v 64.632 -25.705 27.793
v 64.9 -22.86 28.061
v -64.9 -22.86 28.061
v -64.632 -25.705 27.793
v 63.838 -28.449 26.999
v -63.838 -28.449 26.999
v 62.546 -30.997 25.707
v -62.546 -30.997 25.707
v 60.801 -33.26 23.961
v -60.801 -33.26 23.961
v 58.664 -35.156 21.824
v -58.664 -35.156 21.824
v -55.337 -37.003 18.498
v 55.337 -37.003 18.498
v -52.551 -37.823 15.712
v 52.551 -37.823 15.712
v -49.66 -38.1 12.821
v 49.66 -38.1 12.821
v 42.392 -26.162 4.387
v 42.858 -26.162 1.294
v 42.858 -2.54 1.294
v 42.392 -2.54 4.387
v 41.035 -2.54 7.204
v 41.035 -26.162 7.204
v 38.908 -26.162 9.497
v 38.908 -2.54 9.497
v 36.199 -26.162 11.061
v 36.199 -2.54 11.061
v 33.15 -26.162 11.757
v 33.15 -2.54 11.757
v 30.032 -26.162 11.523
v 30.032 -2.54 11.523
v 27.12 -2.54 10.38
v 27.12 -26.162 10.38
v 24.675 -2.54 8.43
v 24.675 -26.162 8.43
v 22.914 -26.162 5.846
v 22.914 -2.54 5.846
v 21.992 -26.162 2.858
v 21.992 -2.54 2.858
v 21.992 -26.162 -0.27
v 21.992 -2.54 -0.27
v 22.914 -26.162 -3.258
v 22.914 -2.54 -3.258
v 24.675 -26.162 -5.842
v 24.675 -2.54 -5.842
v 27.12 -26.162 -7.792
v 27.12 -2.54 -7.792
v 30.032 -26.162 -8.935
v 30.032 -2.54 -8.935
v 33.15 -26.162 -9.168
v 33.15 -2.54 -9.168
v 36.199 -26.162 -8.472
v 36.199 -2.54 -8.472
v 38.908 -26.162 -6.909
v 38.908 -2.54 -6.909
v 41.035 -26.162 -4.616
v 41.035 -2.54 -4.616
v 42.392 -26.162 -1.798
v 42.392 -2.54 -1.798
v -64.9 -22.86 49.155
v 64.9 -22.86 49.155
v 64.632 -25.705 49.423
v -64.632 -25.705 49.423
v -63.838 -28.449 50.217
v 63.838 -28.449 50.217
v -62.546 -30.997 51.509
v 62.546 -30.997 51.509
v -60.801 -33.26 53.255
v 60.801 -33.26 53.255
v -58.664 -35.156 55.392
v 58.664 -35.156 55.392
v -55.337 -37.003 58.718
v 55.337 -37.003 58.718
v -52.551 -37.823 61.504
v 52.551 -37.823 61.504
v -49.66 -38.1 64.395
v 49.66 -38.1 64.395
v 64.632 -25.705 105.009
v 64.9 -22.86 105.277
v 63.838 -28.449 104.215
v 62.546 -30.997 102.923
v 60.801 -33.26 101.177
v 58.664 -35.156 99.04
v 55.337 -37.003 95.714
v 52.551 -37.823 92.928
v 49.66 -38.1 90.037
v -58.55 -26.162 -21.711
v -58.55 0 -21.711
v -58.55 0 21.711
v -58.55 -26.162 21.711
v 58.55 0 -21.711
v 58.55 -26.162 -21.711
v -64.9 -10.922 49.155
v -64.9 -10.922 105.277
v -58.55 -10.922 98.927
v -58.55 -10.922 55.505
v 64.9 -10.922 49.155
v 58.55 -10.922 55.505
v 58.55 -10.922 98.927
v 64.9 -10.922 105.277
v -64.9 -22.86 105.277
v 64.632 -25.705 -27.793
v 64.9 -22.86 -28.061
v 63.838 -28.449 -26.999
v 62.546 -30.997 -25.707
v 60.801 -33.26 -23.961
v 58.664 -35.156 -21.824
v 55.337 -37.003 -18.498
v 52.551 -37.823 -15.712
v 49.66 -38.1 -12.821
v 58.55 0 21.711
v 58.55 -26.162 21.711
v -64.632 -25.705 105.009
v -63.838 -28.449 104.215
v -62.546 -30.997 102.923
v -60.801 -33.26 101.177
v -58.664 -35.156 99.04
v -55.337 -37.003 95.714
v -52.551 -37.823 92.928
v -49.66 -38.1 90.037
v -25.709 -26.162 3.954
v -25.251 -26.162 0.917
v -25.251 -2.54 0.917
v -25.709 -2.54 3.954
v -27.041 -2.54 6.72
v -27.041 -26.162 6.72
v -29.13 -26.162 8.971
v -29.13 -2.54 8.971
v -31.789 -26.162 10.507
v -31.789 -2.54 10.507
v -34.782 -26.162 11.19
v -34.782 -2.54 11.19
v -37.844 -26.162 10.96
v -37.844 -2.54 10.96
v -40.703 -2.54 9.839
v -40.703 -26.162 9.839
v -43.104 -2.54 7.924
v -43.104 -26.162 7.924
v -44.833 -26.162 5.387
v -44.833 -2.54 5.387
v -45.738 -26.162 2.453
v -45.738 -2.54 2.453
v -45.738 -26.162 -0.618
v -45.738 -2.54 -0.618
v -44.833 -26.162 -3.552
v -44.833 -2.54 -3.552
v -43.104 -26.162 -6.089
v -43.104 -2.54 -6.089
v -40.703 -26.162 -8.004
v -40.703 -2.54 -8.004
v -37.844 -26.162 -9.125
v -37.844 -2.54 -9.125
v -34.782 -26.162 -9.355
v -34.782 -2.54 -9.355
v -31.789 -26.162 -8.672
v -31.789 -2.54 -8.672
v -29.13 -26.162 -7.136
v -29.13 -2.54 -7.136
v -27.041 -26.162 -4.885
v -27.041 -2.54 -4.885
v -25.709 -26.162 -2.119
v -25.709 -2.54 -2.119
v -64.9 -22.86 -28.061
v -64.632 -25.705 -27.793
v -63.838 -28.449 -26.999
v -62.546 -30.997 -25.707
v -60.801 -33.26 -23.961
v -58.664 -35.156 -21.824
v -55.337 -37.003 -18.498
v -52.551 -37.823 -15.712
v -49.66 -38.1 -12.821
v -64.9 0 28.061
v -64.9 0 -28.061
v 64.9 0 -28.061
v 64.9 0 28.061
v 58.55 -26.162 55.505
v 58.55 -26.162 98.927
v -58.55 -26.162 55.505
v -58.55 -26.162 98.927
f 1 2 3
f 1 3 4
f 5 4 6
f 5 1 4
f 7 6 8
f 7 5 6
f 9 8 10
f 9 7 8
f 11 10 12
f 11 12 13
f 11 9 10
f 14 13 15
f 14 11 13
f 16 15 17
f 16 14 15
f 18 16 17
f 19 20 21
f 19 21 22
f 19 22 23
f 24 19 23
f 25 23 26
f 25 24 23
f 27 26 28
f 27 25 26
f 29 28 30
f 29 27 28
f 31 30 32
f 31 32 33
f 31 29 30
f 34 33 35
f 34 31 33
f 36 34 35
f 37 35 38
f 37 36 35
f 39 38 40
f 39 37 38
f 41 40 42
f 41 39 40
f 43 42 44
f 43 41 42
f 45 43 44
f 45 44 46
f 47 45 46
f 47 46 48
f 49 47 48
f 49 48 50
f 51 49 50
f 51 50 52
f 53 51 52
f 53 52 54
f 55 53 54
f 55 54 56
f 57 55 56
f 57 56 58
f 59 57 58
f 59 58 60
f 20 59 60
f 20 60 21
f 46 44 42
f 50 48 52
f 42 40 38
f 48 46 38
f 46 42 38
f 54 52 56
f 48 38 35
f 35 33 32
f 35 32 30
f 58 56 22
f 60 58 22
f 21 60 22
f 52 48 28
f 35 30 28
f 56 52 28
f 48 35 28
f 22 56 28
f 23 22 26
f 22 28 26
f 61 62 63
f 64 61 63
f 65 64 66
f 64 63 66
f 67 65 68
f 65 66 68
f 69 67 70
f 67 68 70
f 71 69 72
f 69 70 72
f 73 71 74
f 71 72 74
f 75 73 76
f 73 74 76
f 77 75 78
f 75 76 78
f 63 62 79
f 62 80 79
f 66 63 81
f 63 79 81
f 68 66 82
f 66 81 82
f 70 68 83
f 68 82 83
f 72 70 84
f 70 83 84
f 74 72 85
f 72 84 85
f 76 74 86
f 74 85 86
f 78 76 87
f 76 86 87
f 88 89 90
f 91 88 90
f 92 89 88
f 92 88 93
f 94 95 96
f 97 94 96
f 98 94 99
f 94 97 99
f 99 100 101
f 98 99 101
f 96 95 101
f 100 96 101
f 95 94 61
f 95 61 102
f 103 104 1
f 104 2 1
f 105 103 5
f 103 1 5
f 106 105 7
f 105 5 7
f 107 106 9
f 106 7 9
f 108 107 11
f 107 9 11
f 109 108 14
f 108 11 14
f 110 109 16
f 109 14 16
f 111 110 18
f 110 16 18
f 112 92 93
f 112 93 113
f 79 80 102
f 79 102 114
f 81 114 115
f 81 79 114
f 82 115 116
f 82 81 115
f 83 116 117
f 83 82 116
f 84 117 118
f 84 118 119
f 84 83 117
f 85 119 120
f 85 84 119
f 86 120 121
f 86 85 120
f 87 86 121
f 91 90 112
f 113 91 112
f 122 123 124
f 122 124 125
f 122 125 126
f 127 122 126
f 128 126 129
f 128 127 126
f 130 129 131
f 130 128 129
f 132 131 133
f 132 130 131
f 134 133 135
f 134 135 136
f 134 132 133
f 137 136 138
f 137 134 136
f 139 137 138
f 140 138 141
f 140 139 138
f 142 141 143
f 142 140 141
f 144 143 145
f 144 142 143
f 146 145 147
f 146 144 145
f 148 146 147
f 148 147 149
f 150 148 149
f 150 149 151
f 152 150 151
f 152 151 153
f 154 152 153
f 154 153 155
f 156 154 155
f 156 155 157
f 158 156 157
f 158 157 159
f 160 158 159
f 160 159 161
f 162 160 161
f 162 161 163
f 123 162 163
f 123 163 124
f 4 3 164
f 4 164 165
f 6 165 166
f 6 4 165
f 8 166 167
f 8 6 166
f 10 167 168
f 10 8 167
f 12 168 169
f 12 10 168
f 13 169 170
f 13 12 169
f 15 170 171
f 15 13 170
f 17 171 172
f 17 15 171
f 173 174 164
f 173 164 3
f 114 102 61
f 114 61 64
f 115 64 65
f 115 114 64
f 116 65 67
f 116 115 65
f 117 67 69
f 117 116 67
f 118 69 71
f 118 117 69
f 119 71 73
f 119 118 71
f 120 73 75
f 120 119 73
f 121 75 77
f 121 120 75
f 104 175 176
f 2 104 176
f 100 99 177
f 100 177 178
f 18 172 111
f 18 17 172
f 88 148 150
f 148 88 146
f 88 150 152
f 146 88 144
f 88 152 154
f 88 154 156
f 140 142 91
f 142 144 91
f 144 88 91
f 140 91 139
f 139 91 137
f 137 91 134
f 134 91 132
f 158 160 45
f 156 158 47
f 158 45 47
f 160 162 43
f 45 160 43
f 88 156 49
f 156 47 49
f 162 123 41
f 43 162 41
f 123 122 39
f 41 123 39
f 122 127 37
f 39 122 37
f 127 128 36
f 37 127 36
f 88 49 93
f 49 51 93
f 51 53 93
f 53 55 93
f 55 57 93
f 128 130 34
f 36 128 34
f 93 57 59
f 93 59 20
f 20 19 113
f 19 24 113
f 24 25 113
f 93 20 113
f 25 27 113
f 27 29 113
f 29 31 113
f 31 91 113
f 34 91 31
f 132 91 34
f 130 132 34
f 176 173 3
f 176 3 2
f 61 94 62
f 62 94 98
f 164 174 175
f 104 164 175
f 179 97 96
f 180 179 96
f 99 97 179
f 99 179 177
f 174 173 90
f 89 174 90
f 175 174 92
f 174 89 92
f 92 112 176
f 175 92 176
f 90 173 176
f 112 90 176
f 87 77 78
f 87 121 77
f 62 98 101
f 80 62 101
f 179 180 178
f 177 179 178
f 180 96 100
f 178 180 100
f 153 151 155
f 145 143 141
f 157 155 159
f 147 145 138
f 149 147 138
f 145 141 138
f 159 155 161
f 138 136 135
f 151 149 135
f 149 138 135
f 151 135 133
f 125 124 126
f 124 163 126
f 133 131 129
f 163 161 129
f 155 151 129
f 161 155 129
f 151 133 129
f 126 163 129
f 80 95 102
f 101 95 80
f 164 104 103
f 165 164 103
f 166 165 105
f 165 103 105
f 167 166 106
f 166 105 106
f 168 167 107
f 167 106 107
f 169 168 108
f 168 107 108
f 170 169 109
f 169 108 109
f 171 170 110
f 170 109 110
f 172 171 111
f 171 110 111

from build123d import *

# Parameters (mm, degrees)
F0_W      = 129.8003941774
F0_H      = 56.1221241951
F1_DEPTH  = 38.1
F2_R      = 15.24
F4_W      = 117.1003952622
F4_H      = 43.4221252799
F5_DEPTH  = 26.162
F8_R      = 10.3011434824
F9_DEPTH  = 24.892
F10_R     = 10.4918071363
F11_DEPTH = 24.892
F12_DEPTH = 10.922


with BuildPart() as f1:
    # F0 (on Front) → F1 (new body)
    with BuildSketch(Plane.XZ):
        Rectangle(F0_W, F0_H)
    extrude(amount=F1_DEPTH)

    # F2
    f2_edges = [f1.edges().sort_by_distance(p)[0] for p in [
        (0, -38.1, -28.061062),
        (0, -38.1, 28.061062),
        (-64.900197, -38.1, 0),
        (64.900197, -38.1, 0),
    ]]
    fillet(f2_edges, radius=F2_R)

    # F4 (on face) → F5 (cut)
    with BuildSketch(Plane.XZ):
        Rectangle(F4_W, F4_H)
    extrude(amount=F5_DEPTH, mode=Mode.SUBTRACT)


with BuildPart() as f6_1:
    # F6: copy of F1
    add(f1.part.moved(Location((0, 0, 77.216))))

    # F12 (cut): a face of the model
    f12_faces = [f6_1.faces().sort_by_distance(p)[0] for p in [
        (0, 0, 50.5690749238),
    ]]
    extrude(f12_faces, amount=-F12_DEPTH, mode=Mode.SUBTRACT)


with BuildPart() as f1_1:
    add(f1.part)

    # F8 (on offset) → F9 (join)
    with BuildSketch(Plane.XZ.offset(27.432)):
        with Locations((-35.5522406348, 0.9174930234)):
            Circle(F8_R)
    extrude(amount=-F9_DEPTH)

    # F10 (on offset) → F11 (join)
    with BuildSketch(Plane.XZ.offset(27.432)):
        with Locations((32.3663327513, 1.2941742118)):
            Circle(F10_R)
    extrude(amount=-F11_DEPTH)


solid = Compound([f6_1.part, f1_1.part])
